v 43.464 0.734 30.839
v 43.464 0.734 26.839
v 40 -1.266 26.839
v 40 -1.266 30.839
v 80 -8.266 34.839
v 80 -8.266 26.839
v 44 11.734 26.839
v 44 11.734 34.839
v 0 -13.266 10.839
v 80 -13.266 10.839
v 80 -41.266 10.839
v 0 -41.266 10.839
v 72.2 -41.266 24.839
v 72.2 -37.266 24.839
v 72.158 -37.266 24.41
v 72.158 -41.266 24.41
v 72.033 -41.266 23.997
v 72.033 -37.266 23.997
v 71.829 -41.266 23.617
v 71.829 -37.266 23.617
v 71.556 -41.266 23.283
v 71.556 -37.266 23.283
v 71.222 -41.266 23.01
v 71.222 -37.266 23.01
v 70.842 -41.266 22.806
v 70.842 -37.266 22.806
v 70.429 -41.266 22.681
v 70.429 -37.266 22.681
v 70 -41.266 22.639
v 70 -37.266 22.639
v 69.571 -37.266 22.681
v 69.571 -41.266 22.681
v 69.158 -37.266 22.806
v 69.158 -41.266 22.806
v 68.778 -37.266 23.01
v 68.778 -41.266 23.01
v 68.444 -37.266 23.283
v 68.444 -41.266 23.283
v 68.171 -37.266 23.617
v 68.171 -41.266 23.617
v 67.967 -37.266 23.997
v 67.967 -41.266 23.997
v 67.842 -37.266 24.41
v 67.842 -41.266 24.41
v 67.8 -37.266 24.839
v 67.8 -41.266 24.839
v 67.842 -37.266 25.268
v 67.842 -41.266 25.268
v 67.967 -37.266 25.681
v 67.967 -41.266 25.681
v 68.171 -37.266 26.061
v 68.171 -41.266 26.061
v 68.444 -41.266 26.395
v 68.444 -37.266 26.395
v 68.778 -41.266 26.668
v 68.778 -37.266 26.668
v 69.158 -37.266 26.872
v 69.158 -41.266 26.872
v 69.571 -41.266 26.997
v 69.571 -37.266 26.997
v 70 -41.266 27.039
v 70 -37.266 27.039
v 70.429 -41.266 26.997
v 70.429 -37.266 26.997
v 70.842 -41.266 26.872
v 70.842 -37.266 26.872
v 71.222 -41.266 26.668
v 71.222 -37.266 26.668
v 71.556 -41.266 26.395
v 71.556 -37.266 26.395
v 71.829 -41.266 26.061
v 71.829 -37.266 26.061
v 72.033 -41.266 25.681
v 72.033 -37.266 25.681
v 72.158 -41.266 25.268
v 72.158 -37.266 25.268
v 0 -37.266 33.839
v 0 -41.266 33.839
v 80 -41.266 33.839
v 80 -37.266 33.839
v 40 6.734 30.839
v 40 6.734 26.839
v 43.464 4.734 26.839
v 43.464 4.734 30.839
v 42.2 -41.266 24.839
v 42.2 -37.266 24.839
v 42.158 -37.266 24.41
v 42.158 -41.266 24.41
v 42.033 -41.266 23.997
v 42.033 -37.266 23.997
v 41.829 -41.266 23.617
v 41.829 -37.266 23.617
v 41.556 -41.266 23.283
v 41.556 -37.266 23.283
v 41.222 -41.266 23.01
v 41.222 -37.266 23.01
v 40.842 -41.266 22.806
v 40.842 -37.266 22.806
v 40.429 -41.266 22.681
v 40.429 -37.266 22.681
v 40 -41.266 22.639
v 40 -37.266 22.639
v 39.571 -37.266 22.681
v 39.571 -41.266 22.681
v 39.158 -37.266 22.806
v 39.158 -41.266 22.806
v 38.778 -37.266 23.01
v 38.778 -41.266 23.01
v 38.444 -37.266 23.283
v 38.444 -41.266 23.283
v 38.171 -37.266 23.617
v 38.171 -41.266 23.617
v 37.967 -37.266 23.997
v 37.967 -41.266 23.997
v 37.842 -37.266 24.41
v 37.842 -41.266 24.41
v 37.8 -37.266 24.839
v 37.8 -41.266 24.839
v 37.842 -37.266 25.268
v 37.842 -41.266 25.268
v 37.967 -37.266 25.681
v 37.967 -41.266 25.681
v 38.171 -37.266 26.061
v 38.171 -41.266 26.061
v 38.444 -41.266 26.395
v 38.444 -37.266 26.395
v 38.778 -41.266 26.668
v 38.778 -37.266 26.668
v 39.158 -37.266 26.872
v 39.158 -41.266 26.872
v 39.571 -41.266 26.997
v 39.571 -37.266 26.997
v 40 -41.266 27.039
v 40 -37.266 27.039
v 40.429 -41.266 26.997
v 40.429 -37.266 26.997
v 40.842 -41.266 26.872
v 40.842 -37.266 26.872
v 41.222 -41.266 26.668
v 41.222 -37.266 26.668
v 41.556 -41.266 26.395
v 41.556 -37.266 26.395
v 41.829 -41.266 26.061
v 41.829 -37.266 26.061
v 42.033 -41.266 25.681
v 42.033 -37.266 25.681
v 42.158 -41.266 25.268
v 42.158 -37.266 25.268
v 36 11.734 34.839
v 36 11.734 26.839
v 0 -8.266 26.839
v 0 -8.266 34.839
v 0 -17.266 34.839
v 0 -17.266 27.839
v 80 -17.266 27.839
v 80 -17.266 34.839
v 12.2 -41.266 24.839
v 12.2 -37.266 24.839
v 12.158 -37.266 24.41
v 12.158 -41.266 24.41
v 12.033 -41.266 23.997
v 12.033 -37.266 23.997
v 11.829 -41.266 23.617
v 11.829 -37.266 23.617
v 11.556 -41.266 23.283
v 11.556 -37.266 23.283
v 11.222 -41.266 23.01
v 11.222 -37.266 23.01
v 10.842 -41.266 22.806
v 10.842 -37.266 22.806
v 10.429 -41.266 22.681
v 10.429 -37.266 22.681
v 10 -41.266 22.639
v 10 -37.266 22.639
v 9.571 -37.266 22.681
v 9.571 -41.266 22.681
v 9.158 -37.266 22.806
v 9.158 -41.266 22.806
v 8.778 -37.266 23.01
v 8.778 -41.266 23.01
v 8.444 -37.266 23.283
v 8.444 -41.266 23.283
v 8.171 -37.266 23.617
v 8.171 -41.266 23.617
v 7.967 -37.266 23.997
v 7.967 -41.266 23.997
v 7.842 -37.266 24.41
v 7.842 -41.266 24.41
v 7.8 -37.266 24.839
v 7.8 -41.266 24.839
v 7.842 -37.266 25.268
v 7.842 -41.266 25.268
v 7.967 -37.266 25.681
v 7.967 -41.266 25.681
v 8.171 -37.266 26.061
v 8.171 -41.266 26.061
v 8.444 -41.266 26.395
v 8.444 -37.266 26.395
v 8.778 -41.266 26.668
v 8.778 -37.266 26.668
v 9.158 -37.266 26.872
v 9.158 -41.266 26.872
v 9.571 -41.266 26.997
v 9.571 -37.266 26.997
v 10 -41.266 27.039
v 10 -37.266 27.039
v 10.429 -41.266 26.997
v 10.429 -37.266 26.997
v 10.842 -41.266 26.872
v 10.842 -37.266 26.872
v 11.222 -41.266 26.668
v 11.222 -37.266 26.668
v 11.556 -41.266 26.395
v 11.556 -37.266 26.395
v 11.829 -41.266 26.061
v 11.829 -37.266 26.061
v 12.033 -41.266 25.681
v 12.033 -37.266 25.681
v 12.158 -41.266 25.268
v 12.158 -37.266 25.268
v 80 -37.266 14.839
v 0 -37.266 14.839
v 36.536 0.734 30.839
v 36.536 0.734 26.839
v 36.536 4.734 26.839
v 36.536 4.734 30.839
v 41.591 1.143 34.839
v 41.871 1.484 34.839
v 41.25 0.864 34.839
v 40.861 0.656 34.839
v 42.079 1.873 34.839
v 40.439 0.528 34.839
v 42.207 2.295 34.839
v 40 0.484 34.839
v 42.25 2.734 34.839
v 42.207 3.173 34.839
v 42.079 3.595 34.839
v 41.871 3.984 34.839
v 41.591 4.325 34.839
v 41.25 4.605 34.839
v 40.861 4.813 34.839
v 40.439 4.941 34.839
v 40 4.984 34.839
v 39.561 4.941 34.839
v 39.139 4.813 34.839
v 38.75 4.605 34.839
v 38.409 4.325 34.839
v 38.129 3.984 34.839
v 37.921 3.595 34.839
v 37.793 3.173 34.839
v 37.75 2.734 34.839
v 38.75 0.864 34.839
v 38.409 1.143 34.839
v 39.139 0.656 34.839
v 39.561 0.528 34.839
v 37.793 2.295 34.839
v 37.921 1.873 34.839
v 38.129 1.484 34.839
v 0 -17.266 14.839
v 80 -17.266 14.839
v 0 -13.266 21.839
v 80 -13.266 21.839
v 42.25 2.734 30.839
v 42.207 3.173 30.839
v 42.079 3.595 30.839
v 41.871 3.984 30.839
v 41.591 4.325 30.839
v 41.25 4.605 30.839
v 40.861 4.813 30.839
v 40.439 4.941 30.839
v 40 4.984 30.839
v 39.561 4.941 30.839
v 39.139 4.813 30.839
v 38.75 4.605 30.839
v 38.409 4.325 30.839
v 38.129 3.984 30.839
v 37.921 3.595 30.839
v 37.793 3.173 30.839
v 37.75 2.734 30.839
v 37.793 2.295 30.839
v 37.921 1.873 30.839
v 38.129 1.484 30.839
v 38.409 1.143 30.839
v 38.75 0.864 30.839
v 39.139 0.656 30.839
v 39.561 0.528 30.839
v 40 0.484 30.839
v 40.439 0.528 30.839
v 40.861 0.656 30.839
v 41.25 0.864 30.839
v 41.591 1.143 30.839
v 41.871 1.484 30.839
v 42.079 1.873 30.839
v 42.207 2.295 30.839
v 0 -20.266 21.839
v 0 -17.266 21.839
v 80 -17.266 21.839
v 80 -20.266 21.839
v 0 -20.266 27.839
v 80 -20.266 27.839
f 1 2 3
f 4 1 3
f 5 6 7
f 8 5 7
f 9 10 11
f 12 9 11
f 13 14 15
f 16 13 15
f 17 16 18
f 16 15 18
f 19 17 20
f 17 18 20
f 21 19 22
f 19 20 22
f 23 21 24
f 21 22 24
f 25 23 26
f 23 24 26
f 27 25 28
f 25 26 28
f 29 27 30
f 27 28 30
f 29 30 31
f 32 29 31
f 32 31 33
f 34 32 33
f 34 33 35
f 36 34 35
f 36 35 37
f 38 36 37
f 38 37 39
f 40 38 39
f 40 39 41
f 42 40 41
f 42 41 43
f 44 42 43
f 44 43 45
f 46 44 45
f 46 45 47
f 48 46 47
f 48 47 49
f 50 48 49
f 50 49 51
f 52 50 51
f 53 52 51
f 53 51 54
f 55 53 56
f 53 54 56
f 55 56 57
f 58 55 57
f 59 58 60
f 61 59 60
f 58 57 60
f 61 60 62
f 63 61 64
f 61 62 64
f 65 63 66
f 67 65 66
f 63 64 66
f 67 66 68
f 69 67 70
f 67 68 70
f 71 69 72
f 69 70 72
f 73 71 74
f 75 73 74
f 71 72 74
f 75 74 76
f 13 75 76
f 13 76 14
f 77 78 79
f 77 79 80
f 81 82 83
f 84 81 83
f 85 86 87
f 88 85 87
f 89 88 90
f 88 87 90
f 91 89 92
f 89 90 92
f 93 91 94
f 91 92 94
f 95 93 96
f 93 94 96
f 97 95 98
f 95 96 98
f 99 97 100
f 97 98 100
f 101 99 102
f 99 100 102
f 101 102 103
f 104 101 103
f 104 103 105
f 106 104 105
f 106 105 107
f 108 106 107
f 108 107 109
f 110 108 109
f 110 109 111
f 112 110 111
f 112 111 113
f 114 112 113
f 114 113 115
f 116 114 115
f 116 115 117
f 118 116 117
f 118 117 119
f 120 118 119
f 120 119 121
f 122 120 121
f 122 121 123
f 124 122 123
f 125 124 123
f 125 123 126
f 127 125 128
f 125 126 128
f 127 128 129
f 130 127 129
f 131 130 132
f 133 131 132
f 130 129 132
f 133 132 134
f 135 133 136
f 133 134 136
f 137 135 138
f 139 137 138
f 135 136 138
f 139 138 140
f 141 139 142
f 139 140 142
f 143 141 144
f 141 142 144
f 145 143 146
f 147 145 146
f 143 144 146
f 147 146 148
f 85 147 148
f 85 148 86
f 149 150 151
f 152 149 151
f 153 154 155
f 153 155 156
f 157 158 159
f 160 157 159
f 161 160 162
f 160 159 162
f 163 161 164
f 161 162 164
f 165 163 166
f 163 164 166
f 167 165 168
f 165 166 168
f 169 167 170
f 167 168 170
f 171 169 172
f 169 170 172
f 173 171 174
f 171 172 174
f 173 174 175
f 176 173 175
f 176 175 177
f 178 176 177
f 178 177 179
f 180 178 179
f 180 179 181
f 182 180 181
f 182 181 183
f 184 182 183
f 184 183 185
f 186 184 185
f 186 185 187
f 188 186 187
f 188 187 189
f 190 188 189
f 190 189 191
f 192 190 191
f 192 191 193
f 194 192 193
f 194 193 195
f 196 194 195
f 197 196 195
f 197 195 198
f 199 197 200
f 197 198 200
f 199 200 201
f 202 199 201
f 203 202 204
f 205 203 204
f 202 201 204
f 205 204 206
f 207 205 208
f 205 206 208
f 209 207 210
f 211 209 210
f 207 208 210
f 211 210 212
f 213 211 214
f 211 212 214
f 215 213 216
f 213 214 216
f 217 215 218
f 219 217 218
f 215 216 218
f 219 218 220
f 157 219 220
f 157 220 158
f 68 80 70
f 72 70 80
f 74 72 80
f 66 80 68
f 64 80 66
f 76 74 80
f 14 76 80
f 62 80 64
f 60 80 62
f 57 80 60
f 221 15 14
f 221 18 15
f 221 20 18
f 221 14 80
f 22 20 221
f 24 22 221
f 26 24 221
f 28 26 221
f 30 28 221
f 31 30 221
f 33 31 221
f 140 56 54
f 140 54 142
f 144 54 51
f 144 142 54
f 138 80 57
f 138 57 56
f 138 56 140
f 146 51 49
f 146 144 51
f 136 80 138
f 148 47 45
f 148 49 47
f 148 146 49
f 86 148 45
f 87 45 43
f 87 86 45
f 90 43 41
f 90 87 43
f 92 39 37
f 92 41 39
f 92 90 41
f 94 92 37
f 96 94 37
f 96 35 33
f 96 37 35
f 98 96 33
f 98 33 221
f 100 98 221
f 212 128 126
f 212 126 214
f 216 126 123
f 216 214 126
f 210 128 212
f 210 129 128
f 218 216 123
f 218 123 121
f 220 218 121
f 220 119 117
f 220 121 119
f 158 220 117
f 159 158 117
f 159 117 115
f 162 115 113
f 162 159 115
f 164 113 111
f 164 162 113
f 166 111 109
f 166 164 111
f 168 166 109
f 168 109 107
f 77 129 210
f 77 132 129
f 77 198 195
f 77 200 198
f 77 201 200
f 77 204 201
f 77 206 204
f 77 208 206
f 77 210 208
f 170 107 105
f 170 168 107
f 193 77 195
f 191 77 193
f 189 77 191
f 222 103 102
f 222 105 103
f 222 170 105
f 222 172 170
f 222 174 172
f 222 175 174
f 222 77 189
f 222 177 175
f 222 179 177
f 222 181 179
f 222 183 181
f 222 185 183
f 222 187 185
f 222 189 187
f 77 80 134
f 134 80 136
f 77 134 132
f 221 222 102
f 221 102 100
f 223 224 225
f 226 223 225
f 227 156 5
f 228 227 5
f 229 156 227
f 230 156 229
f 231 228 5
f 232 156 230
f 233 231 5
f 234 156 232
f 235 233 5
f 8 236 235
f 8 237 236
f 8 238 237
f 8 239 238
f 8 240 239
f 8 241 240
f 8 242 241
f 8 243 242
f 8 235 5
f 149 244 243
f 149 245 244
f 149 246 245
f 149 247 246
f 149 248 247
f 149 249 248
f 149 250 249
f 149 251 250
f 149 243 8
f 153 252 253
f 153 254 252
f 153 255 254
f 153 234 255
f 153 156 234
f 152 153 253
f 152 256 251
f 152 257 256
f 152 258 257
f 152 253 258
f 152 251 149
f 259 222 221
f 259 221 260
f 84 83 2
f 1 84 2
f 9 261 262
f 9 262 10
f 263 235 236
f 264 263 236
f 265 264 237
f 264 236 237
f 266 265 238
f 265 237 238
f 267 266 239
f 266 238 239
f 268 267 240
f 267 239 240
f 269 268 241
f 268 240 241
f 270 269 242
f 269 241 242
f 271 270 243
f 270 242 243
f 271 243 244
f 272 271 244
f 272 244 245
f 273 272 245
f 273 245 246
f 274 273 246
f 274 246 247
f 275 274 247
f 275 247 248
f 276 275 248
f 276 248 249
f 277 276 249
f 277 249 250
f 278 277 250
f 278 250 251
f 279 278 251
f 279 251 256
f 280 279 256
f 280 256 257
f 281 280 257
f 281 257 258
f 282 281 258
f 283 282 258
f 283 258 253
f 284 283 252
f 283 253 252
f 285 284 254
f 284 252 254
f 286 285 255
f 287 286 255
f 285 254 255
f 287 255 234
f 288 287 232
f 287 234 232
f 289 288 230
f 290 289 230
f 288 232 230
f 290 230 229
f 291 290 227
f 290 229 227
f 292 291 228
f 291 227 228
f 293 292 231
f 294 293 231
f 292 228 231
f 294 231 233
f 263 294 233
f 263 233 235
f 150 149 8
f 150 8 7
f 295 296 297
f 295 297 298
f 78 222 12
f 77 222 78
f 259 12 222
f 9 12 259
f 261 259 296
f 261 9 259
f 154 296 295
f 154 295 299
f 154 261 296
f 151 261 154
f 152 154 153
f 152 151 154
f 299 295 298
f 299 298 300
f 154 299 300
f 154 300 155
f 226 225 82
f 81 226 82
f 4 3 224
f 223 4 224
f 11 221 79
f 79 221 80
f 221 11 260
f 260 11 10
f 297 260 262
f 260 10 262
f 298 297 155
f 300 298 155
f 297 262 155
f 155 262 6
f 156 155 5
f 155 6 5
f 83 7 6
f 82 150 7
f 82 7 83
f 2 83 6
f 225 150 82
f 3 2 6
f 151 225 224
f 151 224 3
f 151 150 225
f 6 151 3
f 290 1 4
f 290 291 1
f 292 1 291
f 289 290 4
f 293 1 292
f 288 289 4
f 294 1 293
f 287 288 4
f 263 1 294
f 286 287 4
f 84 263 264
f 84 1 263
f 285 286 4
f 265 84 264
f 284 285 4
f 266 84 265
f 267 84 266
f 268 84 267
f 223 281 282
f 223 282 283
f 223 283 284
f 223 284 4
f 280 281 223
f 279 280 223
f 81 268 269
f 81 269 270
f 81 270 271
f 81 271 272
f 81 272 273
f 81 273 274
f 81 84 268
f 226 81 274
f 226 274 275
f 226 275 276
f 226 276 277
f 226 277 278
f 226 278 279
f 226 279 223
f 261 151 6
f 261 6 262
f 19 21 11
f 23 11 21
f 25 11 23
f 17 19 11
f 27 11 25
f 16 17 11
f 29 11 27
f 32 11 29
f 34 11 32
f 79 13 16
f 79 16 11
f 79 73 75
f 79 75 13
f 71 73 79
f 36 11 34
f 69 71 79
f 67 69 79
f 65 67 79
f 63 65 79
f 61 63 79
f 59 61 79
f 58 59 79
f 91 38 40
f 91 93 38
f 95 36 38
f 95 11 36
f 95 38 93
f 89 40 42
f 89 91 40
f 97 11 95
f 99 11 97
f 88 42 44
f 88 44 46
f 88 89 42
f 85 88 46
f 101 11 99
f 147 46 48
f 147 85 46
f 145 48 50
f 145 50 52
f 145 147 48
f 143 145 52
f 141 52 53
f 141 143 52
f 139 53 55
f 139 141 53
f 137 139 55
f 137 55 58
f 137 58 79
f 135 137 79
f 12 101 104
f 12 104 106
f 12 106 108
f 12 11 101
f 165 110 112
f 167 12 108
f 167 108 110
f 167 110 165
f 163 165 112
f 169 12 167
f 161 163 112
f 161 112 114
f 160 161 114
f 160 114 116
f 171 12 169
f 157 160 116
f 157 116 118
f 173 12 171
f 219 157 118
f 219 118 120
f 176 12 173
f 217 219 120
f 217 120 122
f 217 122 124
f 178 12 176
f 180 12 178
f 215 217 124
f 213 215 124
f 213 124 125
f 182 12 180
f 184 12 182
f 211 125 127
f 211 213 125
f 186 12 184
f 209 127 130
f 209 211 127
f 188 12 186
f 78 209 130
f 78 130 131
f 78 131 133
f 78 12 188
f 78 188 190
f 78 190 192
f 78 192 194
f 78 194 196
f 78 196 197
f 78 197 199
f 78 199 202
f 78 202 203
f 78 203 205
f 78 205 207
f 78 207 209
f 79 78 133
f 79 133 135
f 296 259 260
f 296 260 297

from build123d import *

# Parameters (mm, degrees)
BOSS_EXTRU_1_DEPTH      = 80
ENL_V_MAT_EXTRU_1_DEPTH = 9
D_GAGEMENT_M41_D        = 4.5
D_GAGEMENT_M41_DEPTH    = 10
D_GAGEMENT_M41_TIP      = 1.351936393
ENL_V_MAT_EXTRU_2_DEPTH = 4
D_GAGEMENT_M42_D        = 4.4
D_GAGEMENT_M42_DEPTH    = 10
D_GAGEMENT_M42_TIP      = 1.321893362


with BuildPart() as part:
    # Esquisse1 → Boss.-Extru.1 (new body)
    with BuildSketch(Plane(origin=(0, 0, 0), x_dir=(0, 0, -1), z_dir=(1, 0, 0))):
        Polygon((-33.838993879, -37.26557224), (-14.838993879, -37.26557224), (-14.838993879, -17.26557224), (-21.838993879, -17.26557224), (-21.838993879, -20.26557224), (-27.838993879, -20.26557224), (-27.838993879, -17.26557224), (-34.838993879, -17.26557224), (-34.838993879, 11.73442776), (-26.838993879, 11.73442776), (-26.838993879, -8.26557224), (-21.838993879, -13.26557224), (-10.838993879, -13.26557224), (-10.838993879, -41.26557224), (-33.838993879, -41.26557224), align=None)
    extrude(amount=BOSS_EXTRU_1_DEPTH)

    # Esquisse2 → Enlèv. mat.-Extru.1 (cut, through all)
    with BuildSketch(Plane(origin=(0, 0, 26.838993879), x_dir=(-1, 0, 0), z_dir=(0, 0, -1))):
        Polygon((-80, -8.26557224), (-44, 11.73442776), (-36, 11.73442776), (0, -8.26557224), (0, 11.73442776), (-36, 16.436885369), (-44, 16.436885369), (-80, 11.73442776), align=None)
    extrude(amount=-ENL_V_MAT_EXTRU_1_DEPTH, mode=Mode.SUBTRACT)

    # Dégagement M41
    with Locations(Plane(origin=(0, 0, 26.838993879), x_dir=(-1, 0, 0), z_dir=(0, 0, -1))):
        with Locations((-40, 2.73442776)):
            Hole(D_GAGEMENT_M41_D / 2, depth=D_GAGEMENT_M41_DEPTH)
            with Locations((0, 0, -(D_GAGEMENT_M41_DEPTH + D_GAGEMENT_M41_TIP / 2))):  # 118° drill point
                Cone(0, D_GAGEMENT_M41_D / 2, D_GAGEMENT_M41_TIP, mode=Mode.SUBTRACT)

    # Esquisse7 → Enlèv. mat.-Extru.2 (cut)
    with BuildSketch(Plane(origin=(0, 0, 26.838993879), x_dir=(-1, 0, 0), z_dir=(0, 0, -1))):
        Polygon((-40, 6.73442776), (-43.464101615, 4.73442776), (-43.464101615, 0.73442776), (-40, -1.26557224), (-36.535898385, 0.73442776), (-36.535898385, 4.73442776), align=None)
    extrude(amount=-ENL_V_MAT_EXTRU_2_DEPTH, mode=Mode.SUBTRACT)

    # Dégagement M42
    with Locations(Plane(origin=(0, -41.26557224, 0), x_dir=(-1, 0, 0), z_dir=(0, -1, 0))):
        with Locations((-10, -24.838993879), (-40, -24.838993879), (-70, -24.838993879)):
            Hole(D_GAGEMENT_M42_D / 2, depth=D_GAGEMENT_M42_DEPTH)
            with Locations((0, 0, -(D_GAGEMENT_M42_DEPTH + D_GAGEMENT_M42_TIP / 2))):  # 118° drill point
                Cone(0, D_GAGEMENT_M42_D / 2, D_GAGEMENT_M42_TIP, mode=Mode.SUBTRACT)


solid = part.part
